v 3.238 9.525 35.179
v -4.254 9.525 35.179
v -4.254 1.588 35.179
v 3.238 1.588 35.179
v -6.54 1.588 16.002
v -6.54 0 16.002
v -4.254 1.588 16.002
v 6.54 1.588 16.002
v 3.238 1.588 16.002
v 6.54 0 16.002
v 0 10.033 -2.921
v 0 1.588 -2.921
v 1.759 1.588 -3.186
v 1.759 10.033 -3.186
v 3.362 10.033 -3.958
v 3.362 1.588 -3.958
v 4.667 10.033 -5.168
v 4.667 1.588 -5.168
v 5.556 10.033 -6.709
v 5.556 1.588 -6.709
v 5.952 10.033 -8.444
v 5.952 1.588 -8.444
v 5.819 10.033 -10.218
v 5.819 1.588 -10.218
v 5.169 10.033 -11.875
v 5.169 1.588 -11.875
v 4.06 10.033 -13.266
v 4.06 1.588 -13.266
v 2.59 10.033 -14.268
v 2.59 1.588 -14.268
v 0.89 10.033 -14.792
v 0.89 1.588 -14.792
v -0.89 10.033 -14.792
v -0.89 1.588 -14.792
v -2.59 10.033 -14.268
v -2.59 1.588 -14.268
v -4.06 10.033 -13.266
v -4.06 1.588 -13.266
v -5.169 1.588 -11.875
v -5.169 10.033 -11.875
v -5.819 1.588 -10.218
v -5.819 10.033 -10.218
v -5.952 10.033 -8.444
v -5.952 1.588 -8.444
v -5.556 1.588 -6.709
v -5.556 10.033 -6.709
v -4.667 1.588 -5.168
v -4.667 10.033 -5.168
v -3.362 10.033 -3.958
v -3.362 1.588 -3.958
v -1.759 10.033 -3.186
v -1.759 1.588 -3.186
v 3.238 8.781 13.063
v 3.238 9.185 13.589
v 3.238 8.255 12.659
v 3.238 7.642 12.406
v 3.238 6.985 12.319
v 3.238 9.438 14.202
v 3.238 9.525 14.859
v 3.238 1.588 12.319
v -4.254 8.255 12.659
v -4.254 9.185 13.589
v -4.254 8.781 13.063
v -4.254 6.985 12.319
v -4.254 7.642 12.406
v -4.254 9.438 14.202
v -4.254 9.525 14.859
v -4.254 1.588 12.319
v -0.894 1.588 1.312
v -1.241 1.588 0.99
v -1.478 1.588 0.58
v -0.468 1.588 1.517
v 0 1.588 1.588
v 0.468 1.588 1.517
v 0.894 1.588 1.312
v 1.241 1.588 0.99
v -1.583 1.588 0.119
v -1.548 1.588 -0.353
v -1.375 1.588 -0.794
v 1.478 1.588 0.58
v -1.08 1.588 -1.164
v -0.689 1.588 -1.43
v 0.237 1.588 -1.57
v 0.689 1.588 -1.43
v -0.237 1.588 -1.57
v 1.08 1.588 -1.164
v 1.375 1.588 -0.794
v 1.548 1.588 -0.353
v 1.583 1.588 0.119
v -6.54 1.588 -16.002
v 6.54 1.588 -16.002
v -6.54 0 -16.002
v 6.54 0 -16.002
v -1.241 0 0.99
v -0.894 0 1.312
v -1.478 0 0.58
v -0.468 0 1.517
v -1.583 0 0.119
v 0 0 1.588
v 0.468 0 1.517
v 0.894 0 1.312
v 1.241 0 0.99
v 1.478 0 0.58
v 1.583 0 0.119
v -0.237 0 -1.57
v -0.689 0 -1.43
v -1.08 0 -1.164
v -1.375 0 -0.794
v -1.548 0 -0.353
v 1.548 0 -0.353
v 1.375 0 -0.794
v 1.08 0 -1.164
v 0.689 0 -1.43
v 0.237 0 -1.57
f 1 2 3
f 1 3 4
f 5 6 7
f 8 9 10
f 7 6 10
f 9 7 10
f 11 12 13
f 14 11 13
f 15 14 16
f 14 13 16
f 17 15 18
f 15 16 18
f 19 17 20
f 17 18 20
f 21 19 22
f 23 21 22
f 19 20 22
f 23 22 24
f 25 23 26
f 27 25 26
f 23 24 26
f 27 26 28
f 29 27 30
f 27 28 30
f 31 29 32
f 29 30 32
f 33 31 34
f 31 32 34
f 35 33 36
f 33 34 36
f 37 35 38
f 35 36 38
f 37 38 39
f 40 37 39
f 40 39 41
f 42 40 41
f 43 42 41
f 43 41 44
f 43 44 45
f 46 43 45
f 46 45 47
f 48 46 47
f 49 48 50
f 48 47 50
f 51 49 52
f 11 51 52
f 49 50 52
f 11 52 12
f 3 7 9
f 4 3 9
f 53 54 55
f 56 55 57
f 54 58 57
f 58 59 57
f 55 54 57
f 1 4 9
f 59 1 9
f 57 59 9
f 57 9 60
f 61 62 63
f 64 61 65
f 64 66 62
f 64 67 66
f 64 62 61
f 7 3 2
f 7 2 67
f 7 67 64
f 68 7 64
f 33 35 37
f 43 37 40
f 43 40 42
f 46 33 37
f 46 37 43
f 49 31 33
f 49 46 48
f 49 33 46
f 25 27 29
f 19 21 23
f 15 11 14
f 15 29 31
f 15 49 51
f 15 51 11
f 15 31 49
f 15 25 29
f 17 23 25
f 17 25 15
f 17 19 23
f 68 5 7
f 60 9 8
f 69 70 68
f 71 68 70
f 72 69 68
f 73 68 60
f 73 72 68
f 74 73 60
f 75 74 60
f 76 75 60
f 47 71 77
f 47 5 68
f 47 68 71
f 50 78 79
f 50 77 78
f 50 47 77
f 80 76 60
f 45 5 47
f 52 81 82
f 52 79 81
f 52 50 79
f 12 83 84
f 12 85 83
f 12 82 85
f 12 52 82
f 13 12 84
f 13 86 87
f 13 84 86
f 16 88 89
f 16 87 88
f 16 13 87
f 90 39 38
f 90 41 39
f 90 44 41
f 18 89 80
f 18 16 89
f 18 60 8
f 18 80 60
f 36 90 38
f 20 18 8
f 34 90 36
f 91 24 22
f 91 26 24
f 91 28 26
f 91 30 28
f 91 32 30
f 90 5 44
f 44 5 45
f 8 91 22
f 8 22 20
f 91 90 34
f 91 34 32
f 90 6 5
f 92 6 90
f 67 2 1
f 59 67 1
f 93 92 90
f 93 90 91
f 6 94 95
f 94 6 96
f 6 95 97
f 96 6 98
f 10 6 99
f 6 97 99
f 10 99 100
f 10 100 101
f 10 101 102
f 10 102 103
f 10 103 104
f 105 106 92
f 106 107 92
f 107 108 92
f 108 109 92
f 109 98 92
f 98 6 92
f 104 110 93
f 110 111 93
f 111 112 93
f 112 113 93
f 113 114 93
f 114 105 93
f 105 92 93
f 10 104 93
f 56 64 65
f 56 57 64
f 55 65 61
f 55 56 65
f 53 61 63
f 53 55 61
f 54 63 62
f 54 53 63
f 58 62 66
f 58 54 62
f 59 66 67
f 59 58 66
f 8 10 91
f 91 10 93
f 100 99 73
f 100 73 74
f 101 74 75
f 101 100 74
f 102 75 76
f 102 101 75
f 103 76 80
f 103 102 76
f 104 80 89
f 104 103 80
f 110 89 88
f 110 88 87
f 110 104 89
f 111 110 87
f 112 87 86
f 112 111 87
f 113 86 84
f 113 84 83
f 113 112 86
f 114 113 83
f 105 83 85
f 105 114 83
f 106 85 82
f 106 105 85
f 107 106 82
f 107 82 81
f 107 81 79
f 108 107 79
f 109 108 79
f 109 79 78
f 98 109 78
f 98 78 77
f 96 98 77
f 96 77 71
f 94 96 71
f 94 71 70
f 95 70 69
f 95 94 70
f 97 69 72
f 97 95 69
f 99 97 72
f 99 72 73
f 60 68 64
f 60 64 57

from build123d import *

# Parameters (mm, degrees)
SKETCH1_W           = 13.081
SKETCH1_H           = 32.004
SKETCH1_R           = 5.969
SKETCH1_R_2         = 1.5875
BOSS_EXTRUDE1_DEPTH = 1.5875
SKETCH2_R           = 5.969
BOSS_EXTRUDE2_DEPTH = 8.4455
SKETCH3_W           = 7.493
SKETCH3_H           = 22.86
BOSS_EXTRUDE3_DEPTH = 7.9375
FILLET1_R           = 2.54


with BuildPart() as part:
    # Sketch1 → Boss-Extrude1 (new body)
    # profile 1 of 2: a face of its own
    with BuildSketch(Plane(origin=(0, 0, 0), x_dir=(1, 0, 0), z_dir=(0, 1, 0))):
        Rectangle(SKETCH1_W, SKETCH1_H)
        with Locations((0, 8.89)):
            Circle(SKETCH1_R, mode=Mode.SUBTRACT)
        with Locations(Location((0, 0, 0), (0, 0, 270))):
            Circle(SKETCH1_R_2, mode=Mode.SUBTRACT)
    # profile 2 of 2: a face of its own
    with BuildSketch(Plane(origin=(0, 0, 0), x_dir=(1, 0, 0), z_dir=(0, 1, 0))):
        with Locations((0, 8.89)):
            Circle(SKETCH1_R)
    extrude(amount=BOSS_EXTRUDE1_DEPTH)

    # Sketch2 → Boss-Extrude2 (add)
    with BuildSketch(Plane(origin=(0, 1.5875, 0), x_dir=(1, 0, 0), z_dir=(0, 1, 0))):
        with Locations(Location((0, 8.89, 0), (0, 0, 270))):
            Circle(SKETCH2_R)
    extrude(amount=BOSS_EXTRUDE2_DEPTH)

    # Sketch3 → Boss-Extrude3 (add)
    with BuildSketch(Plane(origin=(0, 1.5875, 0), x_dir=(1, 0, 0), z_dir=(0, 1, 0))):
        with Locations((-0.508, -23.749)):
            Rectangle(SKETCH3_W, SKETCH3_H)
    extrude(amount=BOSS_EXTRUDE3_DEPTH)

    # Fillet1
    fillet1_edges = [part.edges().sort_by_distance(p)[0] for p in [
        (-0.508, 9.525, 12.319),
    ]]
    fillet(fillet1_edges, radius=FILLET1_R)


solid = part.part
